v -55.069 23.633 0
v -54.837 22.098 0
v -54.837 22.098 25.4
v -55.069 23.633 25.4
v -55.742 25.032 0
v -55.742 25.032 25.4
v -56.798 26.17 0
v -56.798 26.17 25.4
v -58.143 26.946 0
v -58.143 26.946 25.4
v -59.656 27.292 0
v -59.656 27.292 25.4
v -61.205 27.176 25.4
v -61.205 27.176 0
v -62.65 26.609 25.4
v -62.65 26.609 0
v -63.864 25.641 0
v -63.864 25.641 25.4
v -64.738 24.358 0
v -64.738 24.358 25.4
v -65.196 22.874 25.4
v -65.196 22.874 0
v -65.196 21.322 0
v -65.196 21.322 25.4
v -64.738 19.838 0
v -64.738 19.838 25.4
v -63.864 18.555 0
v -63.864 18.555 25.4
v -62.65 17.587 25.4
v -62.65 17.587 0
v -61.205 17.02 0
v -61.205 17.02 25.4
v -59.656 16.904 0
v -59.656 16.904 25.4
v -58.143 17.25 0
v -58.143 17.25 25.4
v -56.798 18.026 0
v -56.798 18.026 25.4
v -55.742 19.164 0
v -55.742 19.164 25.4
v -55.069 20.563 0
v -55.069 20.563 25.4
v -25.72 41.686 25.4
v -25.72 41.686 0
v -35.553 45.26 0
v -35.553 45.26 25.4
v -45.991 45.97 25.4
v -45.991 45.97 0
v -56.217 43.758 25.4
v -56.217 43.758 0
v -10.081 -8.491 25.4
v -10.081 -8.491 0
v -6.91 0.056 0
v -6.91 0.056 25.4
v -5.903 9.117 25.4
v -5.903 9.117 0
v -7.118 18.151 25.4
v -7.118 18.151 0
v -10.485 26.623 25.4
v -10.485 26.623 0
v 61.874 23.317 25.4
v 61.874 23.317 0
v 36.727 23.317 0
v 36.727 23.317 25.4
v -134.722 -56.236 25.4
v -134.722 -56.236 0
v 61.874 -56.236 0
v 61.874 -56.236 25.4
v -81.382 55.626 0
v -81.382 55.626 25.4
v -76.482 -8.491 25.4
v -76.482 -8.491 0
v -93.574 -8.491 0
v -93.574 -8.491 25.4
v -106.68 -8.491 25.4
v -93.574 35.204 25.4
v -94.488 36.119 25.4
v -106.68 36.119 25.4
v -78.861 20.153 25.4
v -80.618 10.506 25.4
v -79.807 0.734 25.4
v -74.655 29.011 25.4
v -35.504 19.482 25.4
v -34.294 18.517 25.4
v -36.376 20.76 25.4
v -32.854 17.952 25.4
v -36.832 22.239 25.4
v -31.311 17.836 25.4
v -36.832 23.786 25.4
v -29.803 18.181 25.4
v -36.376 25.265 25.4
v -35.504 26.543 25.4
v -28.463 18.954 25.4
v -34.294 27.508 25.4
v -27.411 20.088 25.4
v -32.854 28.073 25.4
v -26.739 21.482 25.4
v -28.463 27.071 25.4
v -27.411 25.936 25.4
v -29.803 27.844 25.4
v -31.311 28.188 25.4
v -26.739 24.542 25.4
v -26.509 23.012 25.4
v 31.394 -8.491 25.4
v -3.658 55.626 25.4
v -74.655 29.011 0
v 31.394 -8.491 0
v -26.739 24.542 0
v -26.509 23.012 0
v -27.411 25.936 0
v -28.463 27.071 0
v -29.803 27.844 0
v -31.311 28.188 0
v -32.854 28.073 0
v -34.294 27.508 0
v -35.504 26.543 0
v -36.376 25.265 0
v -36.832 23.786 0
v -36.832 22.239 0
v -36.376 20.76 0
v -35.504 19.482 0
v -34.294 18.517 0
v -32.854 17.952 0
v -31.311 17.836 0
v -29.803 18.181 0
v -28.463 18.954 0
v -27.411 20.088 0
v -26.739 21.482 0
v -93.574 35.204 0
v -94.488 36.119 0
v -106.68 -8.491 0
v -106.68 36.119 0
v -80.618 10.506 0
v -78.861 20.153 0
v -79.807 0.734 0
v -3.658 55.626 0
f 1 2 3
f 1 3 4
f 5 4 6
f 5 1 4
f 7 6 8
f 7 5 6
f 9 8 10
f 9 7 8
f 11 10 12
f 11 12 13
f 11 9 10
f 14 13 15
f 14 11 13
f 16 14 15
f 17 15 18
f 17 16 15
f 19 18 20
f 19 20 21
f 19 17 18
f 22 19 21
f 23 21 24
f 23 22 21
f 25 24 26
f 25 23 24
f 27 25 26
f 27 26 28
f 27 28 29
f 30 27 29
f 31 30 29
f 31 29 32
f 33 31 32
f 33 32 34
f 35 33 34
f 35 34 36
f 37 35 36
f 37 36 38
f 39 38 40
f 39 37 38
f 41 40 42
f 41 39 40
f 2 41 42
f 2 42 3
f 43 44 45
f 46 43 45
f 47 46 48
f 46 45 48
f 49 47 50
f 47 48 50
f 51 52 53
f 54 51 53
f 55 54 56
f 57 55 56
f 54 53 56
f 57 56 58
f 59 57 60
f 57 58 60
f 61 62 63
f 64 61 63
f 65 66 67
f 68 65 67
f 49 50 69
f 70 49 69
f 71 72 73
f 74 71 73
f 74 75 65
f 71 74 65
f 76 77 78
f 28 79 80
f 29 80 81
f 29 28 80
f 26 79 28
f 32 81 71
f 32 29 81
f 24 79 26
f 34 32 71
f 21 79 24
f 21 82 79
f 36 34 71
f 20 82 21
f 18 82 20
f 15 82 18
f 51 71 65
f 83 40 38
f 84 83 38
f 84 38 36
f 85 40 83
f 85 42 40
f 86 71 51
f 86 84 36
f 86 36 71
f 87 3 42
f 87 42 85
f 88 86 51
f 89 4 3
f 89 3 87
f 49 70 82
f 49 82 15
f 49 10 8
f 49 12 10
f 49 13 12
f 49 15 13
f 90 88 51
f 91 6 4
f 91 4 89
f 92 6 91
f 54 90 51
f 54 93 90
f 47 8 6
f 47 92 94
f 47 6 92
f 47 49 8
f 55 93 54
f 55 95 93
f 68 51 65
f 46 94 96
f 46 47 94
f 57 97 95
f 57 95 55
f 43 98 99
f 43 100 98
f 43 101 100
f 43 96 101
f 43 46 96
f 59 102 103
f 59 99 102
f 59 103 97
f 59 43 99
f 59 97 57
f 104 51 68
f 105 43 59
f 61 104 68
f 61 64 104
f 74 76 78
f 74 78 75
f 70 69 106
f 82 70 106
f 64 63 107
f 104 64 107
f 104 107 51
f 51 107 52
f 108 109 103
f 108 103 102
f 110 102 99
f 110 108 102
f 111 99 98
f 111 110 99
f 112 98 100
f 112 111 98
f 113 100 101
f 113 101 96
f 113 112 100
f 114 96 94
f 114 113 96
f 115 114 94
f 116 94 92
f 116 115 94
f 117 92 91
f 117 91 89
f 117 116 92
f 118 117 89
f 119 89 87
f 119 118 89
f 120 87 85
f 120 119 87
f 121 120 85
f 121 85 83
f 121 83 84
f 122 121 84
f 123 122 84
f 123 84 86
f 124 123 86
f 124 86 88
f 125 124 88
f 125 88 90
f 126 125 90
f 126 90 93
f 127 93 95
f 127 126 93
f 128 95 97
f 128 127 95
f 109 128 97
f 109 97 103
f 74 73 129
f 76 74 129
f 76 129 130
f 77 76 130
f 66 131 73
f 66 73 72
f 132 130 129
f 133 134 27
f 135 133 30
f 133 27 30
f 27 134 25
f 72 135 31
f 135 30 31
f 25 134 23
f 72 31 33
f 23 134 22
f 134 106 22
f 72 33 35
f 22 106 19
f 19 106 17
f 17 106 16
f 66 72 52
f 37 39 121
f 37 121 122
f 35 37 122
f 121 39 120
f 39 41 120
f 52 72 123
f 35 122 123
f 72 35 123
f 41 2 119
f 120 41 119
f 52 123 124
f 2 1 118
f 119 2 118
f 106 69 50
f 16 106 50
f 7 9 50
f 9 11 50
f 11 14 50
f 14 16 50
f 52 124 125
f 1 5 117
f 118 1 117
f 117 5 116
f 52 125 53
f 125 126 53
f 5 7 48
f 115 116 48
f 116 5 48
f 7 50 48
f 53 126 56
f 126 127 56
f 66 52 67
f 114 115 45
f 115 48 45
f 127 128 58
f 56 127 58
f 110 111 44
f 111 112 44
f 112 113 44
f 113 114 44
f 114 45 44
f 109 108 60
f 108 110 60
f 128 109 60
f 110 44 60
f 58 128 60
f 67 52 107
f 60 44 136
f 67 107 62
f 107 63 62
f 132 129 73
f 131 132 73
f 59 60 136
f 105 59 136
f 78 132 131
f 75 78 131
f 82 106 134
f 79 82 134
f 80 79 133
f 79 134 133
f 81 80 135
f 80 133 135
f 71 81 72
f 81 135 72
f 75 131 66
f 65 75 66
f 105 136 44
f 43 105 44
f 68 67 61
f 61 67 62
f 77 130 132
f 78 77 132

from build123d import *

# Parameters (mm, degrees)
F0_R     = 5.208425
F0_R_2   = 5.19056
F1_DEPTH = 25.4


with BuildPart() as f1:
    # F0 (on Top) → F1 (new body)
    with BuildSketch(Plane.XY):
        with BuildLine():
            Line((-81.381604, 55.626001), (-74.654538, 29.011496))
            ThreePointArc((-74.654538, 29.011496), (-80.618498, 10.506301), (-76.482114, -8.491103))
            Line((-76.482114, -8.491103), (-93.5736, -8.491103))
            Line((-93.5736, -8.491103), (-93.5736, 35.204399))
            Line((-93.5736, 35.204399), (-94.488002, 36.118798))
            Line((-94.488002, 36.118798), (-106.680003, 36.118798))
            Line((-106.680003, 36.118798), (-106.680003, -8.491103))
            Line((-106.680003, -8.491103), (-134.721607, -56.2356))
            Line((-134.721607, -56.2356), (61.874397, -56.2356))
            Line((61.874397, -56.2356), (61.874397, 23.317199))
            Line((61.874397, 23.317199), (36.880802, 23.317199))
            Line((36.880802, 23.317199), (36.727491, 23.317199))
            Line((36.727491, 23.317199), (31.394403, -8.491103))
            Line((31.394403, -8.491103), (-10.081085, -8.491103))
            ThreePointArc((-10.081085, -8.491103), (-5.902864, 9.116501), (-10.484758, 26.623401))
            Line((-10.484758, 26.623401), (-3.657602, 55.626001))
            Line((-3.657602, 55.626001), (-25.71959, 41.685744))
            ThreePointArc((-25.71959, 41.685744), (-40.746905, 45.981971), (-56.217321, 43.758464))
            Line((-56.217321, 43.758464), (-81.381604, 55.626001))
        make_face()
        with Locations((-60.0456, 22.098001)):
            Circle(F0_R, mode=Mode.SUBTRACT)
        with Locations((-31.699203, 23.012402)):
            Circle(F0_R_2, mode=Mode.SUBTRACT)
    extrude(amount=F1_DEPTH)


solid = f1.part
